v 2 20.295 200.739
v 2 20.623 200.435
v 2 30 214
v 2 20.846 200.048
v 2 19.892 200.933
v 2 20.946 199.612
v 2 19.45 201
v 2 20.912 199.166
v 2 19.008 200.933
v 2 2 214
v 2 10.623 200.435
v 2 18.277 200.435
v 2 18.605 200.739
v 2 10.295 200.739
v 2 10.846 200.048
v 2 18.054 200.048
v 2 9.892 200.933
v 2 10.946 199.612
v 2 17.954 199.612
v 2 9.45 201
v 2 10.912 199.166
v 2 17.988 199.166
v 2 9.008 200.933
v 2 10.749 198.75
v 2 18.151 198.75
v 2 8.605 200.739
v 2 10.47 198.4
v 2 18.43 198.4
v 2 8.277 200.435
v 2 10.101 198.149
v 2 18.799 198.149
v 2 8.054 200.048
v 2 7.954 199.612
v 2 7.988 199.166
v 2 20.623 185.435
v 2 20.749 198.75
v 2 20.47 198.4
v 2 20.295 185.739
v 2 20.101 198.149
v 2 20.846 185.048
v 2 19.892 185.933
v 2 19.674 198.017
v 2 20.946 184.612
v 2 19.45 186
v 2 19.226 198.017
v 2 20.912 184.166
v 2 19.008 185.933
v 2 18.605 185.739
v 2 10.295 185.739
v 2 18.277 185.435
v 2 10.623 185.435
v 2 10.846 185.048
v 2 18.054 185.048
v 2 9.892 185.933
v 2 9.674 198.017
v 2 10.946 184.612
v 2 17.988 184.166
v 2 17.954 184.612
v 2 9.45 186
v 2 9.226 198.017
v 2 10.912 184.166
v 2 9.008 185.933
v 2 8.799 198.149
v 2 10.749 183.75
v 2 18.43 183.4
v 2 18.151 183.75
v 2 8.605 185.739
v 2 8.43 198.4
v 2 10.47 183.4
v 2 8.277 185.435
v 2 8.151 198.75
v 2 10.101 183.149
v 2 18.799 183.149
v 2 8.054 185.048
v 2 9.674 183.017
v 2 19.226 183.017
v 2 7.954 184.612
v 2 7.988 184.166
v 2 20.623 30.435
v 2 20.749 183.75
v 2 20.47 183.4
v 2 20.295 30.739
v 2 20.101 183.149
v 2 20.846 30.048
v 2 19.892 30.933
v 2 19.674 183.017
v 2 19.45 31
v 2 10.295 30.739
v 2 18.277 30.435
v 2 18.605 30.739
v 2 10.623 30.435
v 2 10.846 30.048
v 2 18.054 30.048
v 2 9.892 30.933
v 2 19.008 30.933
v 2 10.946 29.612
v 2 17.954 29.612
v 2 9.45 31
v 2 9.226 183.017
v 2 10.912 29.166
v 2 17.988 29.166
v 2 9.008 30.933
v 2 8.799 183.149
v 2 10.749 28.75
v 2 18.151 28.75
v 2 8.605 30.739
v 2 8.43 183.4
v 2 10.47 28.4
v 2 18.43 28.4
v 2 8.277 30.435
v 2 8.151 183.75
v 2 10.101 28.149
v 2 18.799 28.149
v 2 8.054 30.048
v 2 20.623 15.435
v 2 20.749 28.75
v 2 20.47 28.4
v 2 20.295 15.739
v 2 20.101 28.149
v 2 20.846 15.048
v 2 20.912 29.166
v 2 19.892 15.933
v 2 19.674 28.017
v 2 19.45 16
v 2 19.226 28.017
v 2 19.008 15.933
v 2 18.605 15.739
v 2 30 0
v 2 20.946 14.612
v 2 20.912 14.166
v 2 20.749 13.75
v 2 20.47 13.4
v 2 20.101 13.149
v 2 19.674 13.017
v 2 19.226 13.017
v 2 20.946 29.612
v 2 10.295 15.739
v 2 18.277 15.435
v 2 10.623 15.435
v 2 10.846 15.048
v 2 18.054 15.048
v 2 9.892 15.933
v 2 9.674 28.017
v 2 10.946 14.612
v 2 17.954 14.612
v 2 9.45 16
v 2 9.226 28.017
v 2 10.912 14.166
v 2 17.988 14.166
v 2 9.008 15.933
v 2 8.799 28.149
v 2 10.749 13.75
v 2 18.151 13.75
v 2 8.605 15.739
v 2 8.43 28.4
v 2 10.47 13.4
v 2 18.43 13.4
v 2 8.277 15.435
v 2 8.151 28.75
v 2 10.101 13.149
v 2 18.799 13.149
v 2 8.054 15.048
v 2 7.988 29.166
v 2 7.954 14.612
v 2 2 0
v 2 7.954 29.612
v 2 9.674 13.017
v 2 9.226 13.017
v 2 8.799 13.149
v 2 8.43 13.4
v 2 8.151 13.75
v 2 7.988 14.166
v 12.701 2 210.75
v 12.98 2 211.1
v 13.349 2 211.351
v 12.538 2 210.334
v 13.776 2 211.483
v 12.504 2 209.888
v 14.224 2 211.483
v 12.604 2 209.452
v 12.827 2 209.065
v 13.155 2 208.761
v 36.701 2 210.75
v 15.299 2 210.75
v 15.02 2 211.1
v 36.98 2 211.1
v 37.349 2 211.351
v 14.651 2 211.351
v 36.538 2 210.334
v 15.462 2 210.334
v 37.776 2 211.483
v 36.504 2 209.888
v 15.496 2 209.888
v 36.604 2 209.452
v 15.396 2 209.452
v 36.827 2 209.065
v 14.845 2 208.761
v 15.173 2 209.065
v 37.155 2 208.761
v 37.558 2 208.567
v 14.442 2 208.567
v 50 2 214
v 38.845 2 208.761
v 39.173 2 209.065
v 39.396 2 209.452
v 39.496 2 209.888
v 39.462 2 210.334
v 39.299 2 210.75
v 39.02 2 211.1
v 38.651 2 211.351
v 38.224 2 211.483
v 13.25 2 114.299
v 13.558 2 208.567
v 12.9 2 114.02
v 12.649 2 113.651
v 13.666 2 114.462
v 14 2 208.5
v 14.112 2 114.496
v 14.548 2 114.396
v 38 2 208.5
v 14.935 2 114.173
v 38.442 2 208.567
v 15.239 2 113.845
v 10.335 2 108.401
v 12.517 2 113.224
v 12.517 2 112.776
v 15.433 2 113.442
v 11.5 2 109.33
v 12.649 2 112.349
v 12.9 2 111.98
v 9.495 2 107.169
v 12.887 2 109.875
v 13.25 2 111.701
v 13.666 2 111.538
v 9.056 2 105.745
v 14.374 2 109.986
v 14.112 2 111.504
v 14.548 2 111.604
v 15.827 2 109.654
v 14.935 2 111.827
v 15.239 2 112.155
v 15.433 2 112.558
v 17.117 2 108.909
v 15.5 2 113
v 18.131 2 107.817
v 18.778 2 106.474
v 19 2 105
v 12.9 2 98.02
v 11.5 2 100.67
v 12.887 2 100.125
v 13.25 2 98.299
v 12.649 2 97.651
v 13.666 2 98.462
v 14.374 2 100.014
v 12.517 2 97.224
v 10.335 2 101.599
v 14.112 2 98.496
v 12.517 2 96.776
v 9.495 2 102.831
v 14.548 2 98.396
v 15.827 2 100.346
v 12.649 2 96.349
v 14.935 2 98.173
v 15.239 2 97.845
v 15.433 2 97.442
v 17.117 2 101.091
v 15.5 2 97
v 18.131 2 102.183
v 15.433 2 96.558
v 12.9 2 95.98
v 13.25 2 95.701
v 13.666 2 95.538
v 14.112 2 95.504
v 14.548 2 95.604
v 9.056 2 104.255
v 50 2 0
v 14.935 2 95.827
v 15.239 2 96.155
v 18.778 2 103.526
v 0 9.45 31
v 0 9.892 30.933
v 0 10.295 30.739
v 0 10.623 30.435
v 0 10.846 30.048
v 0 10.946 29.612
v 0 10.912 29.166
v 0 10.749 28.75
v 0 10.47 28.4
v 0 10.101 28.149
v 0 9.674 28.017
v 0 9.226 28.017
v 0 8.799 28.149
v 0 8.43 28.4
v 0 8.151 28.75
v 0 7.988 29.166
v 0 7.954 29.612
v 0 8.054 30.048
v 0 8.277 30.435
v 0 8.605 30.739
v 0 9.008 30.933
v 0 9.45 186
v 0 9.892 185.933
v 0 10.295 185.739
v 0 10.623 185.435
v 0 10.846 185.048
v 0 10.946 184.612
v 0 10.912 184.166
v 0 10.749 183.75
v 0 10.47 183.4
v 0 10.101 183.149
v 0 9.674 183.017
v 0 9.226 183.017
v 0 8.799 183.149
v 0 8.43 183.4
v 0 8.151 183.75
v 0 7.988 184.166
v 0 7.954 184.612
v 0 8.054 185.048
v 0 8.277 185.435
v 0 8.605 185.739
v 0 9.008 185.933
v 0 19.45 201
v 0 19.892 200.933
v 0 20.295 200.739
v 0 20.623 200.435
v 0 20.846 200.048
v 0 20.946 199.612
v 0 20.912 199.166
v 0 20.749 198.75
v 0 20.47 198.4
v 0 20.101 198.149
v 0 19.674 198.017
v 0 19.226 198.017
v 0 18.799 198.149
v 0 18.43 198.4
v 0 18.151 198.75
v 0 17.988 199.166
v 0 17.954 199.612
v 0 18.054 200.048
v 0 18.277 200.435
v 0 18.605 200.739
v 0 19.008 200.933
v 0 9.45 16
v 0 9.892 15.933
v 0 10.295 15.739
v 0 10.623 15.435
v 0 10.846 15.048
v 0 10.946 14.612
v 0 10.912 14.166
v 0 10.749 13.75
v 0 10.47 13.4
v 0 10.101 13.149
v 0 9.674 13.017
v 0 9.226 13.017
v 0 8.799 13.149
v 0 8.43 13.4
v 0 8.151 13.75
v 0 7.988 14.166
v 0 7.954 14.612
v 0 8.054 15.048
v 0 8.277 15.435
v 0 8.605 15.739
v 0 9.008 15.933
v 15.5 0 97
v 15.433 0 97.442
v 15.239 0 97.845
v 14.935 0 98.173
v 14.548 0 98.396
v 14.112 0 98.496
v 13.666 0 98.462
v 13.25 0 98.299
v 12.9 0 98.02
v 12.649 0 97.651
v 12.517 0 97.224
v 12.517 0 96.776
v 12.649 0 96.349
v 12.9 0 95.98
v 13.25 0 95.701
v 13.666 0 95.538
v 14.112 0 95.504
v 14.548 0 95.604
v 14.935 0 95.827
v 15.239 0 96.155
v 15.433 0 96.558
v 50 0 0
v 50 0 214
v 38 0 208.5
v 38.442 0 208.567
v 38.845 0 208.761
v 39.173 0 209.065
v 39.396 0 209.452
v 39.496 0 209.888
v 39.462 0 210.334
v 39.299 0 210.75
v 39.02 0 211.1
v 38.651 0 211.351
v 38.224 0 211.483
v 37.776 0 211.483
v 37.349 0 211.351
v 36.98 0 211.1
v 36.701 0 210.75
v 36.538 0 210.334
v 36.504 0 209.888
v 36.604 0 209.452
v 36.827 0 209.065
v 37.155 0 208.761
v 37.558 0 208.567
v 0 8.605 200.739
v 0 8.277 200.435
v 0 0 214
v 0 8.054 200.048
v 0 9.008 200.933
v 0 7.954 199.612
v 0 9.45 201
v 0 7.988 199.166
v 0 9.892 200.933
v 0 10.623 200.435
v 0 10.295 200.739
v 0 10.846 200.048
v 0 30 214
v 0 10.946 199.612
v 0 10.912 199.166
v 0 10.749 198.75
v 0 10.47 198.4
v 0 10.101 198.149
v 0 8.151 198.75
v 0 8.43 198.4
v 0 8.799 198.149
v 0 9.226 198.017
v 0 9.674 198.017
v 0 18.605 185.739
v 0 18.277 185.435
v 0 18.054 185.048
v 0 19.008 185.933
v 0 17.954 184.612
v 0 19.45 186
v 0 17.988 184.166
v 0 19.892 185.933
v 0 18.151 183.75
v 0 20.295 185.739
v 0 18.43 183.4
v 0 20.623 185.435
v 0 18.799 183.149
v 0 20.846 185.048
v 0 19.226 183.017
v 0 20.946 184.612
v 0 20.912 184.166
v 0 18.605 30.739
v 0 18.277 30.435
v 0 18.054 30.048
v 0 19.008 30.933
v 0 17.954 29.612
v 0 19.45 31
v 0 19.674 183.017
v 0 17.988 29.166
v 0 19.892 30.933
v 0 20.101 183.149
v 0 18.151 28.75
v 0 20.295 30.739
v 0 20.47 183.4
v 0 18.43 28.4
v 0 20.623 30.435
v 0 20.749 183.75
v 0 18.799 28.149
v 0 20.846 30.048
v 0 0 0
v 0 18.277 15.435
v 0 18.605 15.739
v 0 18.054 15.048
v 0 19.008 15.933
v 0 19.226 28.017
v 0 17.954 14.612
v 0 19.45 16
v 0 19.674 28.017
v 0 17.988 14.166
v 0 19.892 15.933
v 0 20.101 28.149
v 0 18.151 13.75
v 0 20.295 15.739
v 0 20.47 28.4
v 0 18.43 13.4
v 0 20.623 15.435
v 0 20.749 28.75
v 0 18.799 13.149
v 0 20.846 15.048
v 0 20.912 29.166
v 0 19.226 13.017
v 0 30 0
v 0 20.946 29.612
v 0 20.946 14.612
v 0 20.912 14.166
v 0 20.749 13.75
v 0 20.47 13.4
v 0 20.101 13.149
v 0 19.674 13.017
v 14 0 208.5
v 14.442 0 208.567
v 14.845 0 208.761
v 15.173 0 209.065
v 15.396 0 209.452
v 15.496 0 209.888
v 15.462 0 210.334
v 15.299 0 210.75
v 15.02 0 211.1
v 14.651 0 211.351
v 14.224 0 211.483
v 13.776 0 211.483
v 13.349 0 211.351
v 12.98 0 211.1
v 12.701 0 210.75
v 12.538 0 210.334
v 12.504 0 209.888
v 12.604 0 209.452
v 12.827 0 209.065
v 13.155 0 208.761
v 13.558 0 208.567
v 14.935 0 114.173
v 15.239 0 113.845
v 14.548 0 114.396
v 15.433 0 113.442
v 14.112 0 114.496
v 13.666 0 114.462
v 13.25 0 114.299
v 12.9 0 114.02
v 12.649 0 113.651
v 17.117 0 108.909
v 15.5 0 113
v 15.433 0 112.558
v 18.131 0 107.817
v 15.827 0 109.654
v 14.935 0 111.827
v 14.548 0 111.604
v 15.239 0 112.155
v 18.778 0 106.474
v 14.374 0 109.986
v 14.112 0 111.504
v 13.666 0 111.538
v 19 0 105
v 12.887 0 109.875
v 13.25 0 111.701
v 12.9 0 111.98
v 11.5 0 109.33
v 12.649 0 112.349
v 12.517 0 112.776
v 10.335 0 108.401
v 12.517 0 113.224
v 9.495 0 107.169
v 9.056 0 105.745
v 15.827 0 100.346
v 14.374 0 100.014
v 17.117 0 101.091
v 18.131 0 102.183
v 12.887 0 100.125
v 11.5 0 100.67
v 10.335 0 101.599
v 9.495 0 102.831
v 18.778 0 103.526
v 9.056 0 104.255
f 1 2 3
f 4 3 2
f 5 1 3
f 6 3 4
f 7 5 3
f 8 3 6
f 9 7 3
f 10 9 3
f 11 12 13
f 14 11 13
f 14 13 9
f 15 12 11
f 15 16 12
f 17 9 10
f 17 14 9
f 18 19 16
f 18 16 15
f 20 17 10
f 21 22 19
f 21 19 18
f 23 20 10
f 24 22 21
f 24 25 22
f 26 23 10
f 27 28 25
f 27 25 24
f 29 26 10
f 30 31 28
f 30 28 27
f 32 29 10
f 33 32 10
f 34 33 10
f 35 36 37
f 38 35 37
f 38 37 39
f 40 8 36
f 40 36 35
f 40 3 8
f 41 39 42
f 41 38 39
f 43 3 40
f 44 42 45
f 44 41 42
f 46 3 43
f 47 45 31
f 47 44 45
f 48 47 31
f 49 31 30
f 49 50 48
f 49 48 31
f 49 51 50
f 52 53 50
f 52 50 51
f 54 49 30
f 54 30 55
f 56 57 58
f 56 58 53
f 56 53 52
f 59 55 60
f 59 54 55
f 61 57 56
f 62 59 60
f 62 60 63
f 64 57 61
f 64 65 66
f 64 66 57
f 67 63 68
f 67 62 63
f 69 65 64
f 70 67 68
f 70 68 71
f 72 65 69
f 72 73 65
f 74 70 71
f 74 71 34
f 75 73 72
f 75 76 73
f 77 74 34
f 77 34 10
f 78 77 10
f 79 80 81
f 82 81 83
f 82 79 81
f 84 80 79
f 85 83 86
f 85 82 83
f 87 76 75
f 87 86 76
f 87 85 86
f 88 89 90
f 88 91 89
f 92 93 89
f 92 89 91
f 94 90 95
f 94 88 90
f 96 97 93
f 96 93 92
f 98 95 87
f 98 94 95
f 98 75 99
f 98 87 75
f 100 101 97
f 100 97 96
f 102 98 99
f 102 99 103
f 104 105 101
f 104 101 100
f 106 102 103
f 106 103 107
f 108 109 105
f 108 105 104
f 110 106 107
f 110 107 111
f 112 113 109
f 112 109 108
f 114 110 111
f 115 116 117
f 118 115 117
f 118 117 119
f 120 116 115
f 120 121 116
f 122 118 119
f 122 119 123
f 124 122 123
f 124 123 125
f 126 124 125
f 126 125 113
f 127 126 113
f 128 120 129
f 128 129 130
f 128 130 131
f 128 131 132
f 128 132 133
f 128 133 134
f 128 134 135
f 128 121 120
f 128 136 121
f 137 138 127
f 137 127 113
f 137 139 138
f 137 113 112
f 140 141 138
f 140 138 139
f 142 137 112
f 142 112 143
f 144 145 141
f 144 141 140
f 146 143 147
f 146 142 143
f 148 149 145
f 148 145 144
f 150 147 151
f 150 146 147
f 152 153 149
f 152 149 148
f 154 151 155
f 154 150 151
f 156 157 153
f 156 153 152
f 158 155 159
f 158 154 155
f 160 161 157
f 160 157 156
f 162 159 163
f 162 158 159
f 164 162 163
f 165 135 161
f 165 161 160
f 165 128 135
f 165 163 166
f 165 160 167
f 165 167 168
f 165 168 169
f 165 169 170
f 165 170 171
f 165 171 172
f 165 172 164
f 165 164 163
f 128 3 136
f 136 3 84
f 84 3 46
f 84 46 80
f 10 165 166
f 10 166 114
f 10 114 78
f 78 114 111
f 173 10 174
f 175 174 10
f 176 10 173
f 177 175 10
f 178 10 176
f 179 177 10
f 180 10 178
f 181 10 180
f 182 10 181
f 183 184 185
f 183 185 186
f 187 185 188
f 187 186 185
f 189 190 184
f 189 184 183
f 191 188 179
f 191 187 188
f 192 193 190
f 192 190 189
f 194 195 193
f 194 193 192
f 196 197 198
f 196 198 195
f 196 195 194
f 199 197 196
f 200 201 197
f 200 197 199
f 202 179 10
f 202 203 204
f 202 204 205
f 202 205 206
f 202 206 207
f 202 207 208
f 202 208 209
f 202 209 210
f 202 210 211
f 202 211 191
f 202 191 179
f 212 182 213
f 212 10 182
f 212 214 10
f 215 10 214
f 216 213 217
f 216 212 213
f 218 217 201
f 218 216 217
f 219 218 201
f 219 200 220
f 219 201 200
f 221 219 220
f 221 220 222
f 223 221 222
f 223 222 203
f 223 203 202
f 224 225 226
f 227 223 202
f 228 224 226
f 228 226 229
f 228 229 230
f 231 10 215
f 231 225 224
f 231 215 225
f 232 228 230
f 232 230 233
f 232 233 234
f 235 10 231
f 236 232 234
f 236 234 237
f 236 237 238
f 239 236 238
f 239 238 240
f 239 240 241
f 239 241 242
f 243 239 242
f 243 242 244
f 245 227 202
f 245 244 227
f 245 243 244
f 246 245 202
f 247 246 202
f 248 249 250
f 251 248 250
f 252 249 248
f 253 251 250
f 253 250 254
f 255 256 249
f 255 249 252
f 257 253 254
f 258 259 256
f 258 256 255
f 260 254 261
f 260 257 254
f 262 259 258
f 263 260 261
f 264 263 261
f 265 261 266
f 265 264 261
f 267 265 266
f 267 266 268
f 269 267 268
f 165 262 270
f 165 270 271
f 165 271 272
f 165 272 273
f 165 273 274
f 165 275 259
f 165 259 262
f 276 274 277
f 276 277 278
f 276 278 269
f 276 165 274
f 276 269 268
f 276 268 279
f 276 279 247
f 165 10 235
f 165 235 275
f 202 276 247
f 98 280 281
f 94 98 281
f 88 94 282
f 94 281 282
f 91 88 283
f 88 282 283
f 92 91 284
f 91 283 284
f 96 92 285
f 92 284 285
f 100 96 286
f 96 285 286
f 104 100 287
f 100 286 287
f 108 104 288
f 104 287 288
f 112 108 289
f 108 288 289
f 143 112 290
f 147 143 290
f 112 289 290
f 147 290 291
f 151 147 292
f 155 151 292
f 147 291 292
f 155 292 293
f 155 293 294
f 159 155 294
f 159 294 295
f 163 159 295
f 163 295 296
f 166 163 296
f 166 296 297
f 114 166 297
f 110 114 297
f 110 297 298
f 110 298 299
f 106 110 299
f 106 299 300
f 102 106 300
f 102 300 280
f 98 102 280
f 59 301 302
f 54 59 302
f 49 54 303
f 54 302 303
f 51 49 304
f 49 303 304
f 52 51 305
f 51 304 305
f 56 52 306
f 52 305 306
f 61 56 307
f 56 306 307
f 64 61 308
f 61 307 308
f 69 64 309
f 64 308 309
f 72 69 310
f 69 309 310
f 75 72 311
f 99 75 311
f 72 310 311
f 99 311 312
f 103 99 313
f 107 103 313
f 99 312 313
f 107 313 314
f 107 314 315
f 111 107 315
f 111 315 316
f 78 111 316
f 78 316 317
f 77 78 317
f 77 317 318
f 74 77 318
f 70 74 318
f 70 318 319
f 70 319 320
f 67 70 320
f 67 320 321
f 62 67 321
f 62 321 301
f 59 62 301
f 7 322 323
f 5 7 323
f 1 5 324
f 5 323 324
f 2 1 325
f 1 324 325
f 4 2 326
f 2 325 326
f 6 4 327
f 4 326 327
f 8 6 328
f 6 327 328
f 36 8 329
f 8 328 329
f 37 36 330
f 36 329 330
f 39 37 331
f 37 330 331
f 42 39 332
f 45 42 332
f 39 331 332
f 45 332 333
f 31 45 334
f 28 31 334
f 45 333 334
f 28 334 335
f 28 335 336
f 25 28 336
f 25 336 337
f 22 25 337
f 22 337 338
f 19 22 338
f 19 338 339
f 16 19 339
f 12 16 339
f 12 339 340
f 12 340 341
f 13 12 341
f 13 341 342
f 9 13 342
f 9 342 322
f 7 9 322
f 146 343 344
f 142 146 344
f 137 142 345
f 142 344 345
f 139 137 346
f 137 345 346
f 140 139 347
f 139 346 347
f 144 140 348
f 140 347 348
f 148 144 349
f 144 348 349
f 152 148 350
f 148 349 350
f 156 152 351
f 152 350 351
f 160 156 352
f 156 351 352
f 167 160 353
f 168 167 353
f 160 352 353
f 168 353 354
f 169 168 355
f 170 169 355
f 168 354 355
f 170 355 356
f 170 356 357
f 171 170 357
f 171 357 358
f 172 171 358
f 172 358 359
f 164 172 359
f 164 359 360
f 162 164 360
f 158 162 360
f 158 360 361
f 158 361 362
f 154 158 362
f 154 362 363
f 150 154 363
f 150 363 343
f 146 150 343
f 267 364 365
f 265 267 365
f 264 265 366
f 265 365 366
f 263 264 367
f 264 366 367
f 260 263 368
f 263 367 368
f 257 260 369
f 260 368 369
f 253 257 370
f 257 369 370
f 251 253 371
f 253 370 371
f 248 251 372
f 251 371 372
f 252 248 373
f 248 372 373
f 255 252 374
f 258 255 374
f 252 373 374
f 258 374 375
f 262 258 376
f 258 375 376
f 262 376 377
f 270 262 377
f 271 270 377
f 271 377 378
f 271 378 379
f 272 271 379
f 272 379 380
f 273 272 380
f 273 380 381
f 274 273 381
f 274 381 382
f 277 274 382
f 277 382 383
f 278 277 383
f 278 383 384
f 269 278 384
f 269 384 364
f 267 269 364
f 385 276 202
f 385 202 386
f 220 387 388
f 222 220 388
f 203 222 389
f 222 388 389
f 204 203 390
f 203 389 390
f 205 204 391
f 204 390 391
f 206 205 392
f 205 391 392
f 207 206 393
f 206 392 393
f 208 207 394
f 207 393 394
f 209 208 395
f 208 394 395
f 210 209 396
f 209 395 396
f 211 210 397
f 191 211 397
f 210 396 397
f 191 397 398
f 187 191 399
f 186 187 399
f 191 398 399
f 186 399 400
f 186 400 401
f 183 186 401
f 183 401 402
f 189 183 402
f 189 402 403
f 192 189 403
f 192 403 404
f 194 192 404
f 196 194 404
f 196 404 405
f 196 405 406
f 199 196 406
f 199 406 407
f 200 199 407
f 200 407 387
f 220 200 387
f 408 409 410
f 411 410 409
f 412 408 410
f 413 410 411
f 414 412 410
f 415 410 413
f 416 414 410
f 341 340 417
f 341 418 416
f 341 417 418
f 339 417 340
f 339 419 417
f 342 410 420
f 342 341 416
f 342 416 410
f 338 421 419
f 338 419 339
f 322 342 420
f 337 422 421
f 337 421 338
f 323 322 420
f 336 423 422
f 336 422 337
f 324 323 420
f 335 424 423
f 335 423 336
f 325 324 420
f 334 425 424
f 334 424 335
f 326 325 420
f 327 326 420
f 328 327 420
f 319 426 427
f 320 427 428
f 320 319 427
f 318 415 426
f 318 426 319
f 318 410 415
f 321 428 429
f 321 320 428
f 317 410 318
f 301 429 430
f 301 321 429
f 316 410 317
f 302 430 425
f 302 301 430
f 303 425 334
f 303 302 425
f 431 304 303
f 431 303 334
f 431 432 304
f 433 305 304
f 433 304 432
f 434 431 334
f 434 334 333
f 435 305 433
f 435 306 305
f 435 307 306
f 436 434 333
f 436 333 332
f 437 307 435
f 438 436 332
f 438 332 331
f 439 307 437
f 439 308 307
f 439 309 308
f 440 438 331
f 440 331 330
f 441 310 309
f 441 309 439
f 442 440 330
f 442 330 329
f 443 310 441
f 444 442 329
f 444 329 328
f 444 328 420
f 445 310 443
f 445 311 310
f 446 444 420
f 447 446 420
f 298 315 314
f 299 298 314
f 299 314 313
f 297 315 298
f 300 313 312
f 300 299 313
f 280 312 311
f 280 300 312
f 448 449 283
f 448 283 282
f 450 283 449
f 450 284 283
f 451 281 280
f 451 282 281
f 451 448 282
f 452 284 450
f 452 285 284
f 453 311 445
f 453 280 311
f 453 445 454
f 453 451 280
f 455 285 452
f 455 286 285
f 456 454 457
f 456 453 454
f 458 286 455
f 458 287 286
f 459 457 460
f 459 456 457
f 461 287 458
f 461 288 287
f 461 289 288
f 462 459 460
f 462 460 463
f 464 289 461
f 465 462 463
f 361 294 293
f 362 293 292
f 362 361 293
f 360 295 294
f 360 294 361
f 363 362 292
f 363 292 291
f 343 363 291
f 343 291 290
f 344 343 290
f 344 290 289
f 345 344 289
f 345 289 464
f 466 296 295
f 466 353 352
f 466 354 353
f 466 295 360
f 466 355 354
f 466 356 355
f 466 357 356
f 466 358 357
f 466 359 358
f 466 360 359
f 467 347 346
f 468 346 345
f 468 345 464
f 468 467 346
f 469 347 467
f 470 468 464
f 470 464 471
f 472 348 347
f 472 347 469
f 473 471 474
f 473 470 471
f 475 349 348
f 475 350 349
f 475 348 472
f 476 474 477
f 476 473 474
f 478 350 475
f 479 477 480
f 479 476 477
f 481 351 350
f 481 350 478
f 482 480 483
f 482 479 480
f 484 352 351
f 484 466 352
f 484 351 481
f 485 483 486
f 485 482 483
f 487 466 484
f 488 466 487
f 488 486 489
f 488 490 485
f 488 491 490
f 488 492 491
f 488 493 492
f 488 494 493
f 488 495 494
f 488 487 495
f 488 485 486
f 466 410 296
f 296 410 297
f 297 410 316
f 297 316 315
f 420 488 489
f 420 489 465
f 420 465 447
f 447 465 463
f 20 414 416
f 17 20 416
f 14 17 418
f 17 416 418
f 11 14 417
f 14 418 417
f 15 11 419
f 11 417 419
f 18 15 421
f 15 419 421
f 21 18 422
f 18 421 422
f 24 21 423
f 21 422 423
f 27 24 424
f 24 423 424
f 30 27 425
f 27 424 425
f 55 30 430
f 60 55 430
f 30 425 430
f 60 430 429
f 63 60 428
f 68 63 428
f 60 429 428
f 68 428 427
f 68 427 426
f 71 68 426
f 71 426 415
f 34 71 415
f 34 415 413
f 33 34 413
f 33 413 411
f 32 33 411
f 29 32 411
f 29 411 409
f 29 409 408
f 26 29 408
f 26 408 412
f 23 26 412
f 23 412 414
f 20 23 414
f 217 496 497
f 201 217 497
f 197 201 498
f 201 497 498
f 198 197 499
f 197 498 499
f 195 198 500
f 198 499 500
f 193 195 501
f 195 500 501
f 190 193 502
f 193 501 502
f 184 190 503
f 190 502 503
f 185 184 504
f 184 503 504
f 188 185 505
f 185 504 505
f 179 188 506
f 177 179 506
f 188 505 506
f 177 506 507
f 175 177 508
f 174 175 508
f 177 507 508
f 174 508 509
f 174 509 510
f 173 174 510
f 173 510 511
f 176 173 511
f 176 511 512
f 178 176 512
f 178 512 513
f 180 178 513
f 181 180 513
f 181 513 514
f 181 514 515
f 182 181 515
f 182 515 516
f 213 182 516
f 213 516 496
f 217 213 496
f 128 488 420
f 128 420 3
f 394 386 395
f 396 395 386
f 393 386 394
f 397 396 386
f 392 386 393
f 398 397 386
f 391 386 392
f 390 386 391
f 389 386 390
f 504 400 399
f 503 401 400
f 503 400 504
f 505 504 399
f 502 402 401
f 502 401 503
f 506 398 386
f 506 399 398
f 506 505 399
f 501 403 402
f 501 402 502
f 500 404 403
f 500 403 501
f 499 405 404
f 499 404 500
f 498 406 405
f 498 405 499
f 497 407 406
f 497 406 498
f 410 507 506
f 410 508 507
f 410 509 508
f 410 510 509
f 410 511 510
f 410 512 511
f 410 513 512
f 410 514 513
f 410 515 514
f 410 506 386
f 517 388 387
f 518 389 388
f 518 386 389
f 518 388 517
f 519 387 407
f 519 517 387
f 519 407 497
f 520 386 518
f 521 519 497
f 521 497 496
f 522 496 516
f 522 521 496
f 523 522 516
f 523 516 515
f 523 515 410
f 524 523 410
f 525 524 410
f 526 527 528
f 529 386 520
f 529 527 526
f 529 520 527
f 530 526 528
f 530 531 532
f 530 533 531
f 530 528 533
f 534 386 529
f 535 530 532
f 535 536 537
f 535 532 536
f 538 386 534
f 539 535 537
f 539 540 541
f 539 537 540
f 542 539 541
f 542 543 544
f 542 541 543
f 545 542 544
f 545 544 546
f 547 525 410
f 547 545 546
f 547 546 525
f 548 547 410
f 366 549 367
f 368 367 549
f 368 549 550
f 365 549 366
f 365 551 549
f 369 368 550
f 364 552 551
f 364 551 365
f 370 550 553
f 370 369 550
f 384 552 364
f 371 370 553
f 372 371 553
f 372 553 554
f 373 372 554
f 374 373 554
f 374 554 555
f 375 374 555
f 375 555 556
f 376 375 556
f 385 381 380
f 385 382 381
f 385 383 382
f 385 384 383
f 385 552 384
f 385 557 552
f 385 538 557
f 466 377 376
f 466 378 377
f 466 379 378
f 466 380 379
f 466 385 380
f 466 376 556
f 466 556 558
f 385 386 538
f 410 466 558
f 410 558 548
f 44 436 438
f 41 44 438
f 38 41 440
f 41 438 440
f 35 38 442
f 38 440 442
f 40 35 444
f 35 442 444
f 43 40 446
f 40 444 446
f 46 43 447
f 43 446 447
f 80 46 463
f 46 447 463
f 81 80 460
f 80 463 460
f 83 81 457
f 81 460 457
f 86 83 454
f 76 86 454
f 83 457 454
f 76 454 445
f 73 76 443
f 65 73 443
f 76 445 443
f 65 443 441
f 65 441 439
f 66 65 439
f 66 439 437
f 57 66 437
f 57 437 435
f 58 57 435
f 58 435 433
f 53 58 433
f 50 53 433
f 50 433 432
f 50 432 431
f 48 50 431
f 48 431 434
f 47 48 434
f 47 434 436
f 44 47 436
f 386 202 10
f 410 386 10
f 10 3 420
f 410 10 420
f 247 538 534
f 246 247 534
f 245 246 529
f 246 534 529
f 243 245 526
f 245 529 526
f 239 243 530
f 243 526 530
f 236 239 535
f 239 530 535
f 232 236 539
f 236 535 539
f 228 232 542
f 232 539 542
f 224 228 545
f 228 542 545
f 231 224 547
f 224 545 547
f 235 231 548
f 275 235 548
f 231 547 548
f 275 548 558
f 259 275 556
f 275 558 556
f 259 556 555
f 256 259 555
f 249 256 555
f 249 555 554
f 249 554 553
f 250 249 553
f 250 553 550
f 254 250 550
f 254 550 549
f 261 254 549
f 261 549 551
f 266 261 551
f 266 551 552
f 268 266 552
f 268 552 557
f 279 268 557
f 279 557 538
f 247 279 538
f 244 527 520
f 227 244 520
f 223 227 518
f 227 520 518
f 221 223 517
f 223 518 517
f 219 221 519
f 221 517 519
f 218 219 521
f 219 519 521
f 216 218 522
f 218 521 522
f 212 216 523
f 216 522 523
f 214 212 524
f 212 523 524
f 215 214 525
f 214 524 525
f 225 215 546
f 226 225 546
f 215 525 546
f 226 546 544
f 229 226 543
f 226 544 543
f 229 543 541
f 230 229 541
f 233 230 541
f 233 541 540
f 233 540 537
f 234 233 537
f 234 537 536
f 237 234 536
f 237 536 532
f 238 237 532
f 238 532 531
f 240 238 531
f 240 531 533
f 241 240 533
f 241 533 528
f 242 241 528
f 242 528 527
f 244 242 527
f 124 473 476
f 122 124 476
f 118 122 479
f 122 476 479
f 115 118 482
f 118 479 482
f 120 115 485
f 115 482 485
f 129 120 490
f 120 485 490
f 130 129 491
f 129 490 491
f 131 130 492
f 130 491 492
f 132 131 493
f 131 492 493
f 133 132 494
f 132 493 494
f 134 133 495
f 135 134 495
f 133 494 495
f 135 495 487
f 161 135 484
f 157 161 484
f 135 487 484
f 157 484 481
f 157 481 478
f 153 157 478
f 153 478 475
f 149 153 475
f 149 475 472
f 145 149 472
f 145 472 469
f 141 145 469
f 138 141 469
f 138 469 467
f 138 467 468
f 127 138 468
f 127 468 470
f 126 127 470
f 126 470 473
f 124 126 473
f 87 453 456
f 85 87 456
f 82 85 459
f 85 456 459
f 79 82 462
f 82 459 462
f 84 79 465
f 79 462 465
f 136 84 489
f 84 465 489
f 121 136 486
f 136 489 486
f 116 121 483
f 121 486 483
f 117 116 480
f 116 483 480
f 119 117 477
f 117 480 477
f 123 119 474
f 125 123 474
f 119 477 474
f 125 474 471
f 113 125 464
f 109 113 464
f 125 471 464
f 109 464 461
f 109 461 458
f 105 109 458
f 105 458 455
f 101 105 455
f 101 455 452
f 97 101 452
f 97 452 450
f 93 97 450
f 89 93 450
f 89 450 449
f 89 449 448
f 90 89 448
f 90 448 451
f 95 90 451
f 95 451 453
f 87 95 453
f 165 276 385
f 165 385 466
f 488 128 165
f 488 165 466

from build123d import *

# Parameters (mm, degrees)
BOSS_EXTRUDE1_DEPTH      = 214
SKETCH2_R                = 5
CUT_EXTRUDE1_DEPTH       = 222.801713249
SKETCH4_R                = 1.500000001
CUT_EXTRUDE3_DEPTH       = 222.801713249
F_3_0_3_DIAMETER_HOLE1_D = 3
F_3_0_3_DIAMETER_HOLE2_D = 3


with BuildPart() as part:
    # Sketch1 → Boss-Extrude1 (new body)
    with BuildSketch(Plane.XY):
        Polygon((0, 0), (0, 30), (2, 30), (2, 2), (50, 2), (50, 0), align=None)
    extrude(amount=BOSS_EXTRUDE1_DEPTH)

    # Sketch2 → Cut-Extrude1 (cut, through all)
    with BuildSketch(Plane.XZ):
        with Locations((14, 105)):
            Circle(SKETCH2_R)
    extrude(amount=-CUT_EXTRUDE1_DEPTH, mode=Mode.SUBTRACT)

    # Sketch4 → Cut-Extrude3 (cut, through all)
    with BuildSketch(Plane(origin=(0, 0, 0), x_dir=(-1, 0, 0), z_dir=(0, -1, 0))):
        with Locations(Location((-14.000000126, -112.999999976, 0), (0, 0, 180))):
            Circle(SKETCH4_R)
        with Locations(Location((-14.000000126, -96.999999976, 0), (0, 0, 180))):
            Circle(SKETCH4_R)
    extrude(amount=-CUT_EXTRUDE3_DEPTH, mode=Mode.SUBTRACT)

    # Ø3.0 (3) Diameter Hole1 (through all)
    with Locations(Plane(origin=(2, 0, 0), x_dir=(0, 0, -1), z_dir=(1, 0, 0))):
        with Locations((-199.5, 9.45), (-199.5, 19.45), (-184.5, 19.450012476), (-184.5, 9.45), (-29.5, 19.45), (-29.5, 9.45), (-14.5, 9.45), (-14.5, 19.45)):
            Hole(F_3_0_3_DIAMETER_HOLE1_D / 2)

    # Ø3.0 (3) Diameter Hole2 (through all)
    with Locations(Plane(origin=(-23.407632793, 2, 151.138003919), x_dir=(0, 0, 1), z_dir=(0, 1, 0))):
        with Locations((58.861996081, 61.407632793), (58.861996081, 37.407632793)):
            Hole(F_3_0_3_DIAMETER_HOLE2_D / 2)


solid = part.part
